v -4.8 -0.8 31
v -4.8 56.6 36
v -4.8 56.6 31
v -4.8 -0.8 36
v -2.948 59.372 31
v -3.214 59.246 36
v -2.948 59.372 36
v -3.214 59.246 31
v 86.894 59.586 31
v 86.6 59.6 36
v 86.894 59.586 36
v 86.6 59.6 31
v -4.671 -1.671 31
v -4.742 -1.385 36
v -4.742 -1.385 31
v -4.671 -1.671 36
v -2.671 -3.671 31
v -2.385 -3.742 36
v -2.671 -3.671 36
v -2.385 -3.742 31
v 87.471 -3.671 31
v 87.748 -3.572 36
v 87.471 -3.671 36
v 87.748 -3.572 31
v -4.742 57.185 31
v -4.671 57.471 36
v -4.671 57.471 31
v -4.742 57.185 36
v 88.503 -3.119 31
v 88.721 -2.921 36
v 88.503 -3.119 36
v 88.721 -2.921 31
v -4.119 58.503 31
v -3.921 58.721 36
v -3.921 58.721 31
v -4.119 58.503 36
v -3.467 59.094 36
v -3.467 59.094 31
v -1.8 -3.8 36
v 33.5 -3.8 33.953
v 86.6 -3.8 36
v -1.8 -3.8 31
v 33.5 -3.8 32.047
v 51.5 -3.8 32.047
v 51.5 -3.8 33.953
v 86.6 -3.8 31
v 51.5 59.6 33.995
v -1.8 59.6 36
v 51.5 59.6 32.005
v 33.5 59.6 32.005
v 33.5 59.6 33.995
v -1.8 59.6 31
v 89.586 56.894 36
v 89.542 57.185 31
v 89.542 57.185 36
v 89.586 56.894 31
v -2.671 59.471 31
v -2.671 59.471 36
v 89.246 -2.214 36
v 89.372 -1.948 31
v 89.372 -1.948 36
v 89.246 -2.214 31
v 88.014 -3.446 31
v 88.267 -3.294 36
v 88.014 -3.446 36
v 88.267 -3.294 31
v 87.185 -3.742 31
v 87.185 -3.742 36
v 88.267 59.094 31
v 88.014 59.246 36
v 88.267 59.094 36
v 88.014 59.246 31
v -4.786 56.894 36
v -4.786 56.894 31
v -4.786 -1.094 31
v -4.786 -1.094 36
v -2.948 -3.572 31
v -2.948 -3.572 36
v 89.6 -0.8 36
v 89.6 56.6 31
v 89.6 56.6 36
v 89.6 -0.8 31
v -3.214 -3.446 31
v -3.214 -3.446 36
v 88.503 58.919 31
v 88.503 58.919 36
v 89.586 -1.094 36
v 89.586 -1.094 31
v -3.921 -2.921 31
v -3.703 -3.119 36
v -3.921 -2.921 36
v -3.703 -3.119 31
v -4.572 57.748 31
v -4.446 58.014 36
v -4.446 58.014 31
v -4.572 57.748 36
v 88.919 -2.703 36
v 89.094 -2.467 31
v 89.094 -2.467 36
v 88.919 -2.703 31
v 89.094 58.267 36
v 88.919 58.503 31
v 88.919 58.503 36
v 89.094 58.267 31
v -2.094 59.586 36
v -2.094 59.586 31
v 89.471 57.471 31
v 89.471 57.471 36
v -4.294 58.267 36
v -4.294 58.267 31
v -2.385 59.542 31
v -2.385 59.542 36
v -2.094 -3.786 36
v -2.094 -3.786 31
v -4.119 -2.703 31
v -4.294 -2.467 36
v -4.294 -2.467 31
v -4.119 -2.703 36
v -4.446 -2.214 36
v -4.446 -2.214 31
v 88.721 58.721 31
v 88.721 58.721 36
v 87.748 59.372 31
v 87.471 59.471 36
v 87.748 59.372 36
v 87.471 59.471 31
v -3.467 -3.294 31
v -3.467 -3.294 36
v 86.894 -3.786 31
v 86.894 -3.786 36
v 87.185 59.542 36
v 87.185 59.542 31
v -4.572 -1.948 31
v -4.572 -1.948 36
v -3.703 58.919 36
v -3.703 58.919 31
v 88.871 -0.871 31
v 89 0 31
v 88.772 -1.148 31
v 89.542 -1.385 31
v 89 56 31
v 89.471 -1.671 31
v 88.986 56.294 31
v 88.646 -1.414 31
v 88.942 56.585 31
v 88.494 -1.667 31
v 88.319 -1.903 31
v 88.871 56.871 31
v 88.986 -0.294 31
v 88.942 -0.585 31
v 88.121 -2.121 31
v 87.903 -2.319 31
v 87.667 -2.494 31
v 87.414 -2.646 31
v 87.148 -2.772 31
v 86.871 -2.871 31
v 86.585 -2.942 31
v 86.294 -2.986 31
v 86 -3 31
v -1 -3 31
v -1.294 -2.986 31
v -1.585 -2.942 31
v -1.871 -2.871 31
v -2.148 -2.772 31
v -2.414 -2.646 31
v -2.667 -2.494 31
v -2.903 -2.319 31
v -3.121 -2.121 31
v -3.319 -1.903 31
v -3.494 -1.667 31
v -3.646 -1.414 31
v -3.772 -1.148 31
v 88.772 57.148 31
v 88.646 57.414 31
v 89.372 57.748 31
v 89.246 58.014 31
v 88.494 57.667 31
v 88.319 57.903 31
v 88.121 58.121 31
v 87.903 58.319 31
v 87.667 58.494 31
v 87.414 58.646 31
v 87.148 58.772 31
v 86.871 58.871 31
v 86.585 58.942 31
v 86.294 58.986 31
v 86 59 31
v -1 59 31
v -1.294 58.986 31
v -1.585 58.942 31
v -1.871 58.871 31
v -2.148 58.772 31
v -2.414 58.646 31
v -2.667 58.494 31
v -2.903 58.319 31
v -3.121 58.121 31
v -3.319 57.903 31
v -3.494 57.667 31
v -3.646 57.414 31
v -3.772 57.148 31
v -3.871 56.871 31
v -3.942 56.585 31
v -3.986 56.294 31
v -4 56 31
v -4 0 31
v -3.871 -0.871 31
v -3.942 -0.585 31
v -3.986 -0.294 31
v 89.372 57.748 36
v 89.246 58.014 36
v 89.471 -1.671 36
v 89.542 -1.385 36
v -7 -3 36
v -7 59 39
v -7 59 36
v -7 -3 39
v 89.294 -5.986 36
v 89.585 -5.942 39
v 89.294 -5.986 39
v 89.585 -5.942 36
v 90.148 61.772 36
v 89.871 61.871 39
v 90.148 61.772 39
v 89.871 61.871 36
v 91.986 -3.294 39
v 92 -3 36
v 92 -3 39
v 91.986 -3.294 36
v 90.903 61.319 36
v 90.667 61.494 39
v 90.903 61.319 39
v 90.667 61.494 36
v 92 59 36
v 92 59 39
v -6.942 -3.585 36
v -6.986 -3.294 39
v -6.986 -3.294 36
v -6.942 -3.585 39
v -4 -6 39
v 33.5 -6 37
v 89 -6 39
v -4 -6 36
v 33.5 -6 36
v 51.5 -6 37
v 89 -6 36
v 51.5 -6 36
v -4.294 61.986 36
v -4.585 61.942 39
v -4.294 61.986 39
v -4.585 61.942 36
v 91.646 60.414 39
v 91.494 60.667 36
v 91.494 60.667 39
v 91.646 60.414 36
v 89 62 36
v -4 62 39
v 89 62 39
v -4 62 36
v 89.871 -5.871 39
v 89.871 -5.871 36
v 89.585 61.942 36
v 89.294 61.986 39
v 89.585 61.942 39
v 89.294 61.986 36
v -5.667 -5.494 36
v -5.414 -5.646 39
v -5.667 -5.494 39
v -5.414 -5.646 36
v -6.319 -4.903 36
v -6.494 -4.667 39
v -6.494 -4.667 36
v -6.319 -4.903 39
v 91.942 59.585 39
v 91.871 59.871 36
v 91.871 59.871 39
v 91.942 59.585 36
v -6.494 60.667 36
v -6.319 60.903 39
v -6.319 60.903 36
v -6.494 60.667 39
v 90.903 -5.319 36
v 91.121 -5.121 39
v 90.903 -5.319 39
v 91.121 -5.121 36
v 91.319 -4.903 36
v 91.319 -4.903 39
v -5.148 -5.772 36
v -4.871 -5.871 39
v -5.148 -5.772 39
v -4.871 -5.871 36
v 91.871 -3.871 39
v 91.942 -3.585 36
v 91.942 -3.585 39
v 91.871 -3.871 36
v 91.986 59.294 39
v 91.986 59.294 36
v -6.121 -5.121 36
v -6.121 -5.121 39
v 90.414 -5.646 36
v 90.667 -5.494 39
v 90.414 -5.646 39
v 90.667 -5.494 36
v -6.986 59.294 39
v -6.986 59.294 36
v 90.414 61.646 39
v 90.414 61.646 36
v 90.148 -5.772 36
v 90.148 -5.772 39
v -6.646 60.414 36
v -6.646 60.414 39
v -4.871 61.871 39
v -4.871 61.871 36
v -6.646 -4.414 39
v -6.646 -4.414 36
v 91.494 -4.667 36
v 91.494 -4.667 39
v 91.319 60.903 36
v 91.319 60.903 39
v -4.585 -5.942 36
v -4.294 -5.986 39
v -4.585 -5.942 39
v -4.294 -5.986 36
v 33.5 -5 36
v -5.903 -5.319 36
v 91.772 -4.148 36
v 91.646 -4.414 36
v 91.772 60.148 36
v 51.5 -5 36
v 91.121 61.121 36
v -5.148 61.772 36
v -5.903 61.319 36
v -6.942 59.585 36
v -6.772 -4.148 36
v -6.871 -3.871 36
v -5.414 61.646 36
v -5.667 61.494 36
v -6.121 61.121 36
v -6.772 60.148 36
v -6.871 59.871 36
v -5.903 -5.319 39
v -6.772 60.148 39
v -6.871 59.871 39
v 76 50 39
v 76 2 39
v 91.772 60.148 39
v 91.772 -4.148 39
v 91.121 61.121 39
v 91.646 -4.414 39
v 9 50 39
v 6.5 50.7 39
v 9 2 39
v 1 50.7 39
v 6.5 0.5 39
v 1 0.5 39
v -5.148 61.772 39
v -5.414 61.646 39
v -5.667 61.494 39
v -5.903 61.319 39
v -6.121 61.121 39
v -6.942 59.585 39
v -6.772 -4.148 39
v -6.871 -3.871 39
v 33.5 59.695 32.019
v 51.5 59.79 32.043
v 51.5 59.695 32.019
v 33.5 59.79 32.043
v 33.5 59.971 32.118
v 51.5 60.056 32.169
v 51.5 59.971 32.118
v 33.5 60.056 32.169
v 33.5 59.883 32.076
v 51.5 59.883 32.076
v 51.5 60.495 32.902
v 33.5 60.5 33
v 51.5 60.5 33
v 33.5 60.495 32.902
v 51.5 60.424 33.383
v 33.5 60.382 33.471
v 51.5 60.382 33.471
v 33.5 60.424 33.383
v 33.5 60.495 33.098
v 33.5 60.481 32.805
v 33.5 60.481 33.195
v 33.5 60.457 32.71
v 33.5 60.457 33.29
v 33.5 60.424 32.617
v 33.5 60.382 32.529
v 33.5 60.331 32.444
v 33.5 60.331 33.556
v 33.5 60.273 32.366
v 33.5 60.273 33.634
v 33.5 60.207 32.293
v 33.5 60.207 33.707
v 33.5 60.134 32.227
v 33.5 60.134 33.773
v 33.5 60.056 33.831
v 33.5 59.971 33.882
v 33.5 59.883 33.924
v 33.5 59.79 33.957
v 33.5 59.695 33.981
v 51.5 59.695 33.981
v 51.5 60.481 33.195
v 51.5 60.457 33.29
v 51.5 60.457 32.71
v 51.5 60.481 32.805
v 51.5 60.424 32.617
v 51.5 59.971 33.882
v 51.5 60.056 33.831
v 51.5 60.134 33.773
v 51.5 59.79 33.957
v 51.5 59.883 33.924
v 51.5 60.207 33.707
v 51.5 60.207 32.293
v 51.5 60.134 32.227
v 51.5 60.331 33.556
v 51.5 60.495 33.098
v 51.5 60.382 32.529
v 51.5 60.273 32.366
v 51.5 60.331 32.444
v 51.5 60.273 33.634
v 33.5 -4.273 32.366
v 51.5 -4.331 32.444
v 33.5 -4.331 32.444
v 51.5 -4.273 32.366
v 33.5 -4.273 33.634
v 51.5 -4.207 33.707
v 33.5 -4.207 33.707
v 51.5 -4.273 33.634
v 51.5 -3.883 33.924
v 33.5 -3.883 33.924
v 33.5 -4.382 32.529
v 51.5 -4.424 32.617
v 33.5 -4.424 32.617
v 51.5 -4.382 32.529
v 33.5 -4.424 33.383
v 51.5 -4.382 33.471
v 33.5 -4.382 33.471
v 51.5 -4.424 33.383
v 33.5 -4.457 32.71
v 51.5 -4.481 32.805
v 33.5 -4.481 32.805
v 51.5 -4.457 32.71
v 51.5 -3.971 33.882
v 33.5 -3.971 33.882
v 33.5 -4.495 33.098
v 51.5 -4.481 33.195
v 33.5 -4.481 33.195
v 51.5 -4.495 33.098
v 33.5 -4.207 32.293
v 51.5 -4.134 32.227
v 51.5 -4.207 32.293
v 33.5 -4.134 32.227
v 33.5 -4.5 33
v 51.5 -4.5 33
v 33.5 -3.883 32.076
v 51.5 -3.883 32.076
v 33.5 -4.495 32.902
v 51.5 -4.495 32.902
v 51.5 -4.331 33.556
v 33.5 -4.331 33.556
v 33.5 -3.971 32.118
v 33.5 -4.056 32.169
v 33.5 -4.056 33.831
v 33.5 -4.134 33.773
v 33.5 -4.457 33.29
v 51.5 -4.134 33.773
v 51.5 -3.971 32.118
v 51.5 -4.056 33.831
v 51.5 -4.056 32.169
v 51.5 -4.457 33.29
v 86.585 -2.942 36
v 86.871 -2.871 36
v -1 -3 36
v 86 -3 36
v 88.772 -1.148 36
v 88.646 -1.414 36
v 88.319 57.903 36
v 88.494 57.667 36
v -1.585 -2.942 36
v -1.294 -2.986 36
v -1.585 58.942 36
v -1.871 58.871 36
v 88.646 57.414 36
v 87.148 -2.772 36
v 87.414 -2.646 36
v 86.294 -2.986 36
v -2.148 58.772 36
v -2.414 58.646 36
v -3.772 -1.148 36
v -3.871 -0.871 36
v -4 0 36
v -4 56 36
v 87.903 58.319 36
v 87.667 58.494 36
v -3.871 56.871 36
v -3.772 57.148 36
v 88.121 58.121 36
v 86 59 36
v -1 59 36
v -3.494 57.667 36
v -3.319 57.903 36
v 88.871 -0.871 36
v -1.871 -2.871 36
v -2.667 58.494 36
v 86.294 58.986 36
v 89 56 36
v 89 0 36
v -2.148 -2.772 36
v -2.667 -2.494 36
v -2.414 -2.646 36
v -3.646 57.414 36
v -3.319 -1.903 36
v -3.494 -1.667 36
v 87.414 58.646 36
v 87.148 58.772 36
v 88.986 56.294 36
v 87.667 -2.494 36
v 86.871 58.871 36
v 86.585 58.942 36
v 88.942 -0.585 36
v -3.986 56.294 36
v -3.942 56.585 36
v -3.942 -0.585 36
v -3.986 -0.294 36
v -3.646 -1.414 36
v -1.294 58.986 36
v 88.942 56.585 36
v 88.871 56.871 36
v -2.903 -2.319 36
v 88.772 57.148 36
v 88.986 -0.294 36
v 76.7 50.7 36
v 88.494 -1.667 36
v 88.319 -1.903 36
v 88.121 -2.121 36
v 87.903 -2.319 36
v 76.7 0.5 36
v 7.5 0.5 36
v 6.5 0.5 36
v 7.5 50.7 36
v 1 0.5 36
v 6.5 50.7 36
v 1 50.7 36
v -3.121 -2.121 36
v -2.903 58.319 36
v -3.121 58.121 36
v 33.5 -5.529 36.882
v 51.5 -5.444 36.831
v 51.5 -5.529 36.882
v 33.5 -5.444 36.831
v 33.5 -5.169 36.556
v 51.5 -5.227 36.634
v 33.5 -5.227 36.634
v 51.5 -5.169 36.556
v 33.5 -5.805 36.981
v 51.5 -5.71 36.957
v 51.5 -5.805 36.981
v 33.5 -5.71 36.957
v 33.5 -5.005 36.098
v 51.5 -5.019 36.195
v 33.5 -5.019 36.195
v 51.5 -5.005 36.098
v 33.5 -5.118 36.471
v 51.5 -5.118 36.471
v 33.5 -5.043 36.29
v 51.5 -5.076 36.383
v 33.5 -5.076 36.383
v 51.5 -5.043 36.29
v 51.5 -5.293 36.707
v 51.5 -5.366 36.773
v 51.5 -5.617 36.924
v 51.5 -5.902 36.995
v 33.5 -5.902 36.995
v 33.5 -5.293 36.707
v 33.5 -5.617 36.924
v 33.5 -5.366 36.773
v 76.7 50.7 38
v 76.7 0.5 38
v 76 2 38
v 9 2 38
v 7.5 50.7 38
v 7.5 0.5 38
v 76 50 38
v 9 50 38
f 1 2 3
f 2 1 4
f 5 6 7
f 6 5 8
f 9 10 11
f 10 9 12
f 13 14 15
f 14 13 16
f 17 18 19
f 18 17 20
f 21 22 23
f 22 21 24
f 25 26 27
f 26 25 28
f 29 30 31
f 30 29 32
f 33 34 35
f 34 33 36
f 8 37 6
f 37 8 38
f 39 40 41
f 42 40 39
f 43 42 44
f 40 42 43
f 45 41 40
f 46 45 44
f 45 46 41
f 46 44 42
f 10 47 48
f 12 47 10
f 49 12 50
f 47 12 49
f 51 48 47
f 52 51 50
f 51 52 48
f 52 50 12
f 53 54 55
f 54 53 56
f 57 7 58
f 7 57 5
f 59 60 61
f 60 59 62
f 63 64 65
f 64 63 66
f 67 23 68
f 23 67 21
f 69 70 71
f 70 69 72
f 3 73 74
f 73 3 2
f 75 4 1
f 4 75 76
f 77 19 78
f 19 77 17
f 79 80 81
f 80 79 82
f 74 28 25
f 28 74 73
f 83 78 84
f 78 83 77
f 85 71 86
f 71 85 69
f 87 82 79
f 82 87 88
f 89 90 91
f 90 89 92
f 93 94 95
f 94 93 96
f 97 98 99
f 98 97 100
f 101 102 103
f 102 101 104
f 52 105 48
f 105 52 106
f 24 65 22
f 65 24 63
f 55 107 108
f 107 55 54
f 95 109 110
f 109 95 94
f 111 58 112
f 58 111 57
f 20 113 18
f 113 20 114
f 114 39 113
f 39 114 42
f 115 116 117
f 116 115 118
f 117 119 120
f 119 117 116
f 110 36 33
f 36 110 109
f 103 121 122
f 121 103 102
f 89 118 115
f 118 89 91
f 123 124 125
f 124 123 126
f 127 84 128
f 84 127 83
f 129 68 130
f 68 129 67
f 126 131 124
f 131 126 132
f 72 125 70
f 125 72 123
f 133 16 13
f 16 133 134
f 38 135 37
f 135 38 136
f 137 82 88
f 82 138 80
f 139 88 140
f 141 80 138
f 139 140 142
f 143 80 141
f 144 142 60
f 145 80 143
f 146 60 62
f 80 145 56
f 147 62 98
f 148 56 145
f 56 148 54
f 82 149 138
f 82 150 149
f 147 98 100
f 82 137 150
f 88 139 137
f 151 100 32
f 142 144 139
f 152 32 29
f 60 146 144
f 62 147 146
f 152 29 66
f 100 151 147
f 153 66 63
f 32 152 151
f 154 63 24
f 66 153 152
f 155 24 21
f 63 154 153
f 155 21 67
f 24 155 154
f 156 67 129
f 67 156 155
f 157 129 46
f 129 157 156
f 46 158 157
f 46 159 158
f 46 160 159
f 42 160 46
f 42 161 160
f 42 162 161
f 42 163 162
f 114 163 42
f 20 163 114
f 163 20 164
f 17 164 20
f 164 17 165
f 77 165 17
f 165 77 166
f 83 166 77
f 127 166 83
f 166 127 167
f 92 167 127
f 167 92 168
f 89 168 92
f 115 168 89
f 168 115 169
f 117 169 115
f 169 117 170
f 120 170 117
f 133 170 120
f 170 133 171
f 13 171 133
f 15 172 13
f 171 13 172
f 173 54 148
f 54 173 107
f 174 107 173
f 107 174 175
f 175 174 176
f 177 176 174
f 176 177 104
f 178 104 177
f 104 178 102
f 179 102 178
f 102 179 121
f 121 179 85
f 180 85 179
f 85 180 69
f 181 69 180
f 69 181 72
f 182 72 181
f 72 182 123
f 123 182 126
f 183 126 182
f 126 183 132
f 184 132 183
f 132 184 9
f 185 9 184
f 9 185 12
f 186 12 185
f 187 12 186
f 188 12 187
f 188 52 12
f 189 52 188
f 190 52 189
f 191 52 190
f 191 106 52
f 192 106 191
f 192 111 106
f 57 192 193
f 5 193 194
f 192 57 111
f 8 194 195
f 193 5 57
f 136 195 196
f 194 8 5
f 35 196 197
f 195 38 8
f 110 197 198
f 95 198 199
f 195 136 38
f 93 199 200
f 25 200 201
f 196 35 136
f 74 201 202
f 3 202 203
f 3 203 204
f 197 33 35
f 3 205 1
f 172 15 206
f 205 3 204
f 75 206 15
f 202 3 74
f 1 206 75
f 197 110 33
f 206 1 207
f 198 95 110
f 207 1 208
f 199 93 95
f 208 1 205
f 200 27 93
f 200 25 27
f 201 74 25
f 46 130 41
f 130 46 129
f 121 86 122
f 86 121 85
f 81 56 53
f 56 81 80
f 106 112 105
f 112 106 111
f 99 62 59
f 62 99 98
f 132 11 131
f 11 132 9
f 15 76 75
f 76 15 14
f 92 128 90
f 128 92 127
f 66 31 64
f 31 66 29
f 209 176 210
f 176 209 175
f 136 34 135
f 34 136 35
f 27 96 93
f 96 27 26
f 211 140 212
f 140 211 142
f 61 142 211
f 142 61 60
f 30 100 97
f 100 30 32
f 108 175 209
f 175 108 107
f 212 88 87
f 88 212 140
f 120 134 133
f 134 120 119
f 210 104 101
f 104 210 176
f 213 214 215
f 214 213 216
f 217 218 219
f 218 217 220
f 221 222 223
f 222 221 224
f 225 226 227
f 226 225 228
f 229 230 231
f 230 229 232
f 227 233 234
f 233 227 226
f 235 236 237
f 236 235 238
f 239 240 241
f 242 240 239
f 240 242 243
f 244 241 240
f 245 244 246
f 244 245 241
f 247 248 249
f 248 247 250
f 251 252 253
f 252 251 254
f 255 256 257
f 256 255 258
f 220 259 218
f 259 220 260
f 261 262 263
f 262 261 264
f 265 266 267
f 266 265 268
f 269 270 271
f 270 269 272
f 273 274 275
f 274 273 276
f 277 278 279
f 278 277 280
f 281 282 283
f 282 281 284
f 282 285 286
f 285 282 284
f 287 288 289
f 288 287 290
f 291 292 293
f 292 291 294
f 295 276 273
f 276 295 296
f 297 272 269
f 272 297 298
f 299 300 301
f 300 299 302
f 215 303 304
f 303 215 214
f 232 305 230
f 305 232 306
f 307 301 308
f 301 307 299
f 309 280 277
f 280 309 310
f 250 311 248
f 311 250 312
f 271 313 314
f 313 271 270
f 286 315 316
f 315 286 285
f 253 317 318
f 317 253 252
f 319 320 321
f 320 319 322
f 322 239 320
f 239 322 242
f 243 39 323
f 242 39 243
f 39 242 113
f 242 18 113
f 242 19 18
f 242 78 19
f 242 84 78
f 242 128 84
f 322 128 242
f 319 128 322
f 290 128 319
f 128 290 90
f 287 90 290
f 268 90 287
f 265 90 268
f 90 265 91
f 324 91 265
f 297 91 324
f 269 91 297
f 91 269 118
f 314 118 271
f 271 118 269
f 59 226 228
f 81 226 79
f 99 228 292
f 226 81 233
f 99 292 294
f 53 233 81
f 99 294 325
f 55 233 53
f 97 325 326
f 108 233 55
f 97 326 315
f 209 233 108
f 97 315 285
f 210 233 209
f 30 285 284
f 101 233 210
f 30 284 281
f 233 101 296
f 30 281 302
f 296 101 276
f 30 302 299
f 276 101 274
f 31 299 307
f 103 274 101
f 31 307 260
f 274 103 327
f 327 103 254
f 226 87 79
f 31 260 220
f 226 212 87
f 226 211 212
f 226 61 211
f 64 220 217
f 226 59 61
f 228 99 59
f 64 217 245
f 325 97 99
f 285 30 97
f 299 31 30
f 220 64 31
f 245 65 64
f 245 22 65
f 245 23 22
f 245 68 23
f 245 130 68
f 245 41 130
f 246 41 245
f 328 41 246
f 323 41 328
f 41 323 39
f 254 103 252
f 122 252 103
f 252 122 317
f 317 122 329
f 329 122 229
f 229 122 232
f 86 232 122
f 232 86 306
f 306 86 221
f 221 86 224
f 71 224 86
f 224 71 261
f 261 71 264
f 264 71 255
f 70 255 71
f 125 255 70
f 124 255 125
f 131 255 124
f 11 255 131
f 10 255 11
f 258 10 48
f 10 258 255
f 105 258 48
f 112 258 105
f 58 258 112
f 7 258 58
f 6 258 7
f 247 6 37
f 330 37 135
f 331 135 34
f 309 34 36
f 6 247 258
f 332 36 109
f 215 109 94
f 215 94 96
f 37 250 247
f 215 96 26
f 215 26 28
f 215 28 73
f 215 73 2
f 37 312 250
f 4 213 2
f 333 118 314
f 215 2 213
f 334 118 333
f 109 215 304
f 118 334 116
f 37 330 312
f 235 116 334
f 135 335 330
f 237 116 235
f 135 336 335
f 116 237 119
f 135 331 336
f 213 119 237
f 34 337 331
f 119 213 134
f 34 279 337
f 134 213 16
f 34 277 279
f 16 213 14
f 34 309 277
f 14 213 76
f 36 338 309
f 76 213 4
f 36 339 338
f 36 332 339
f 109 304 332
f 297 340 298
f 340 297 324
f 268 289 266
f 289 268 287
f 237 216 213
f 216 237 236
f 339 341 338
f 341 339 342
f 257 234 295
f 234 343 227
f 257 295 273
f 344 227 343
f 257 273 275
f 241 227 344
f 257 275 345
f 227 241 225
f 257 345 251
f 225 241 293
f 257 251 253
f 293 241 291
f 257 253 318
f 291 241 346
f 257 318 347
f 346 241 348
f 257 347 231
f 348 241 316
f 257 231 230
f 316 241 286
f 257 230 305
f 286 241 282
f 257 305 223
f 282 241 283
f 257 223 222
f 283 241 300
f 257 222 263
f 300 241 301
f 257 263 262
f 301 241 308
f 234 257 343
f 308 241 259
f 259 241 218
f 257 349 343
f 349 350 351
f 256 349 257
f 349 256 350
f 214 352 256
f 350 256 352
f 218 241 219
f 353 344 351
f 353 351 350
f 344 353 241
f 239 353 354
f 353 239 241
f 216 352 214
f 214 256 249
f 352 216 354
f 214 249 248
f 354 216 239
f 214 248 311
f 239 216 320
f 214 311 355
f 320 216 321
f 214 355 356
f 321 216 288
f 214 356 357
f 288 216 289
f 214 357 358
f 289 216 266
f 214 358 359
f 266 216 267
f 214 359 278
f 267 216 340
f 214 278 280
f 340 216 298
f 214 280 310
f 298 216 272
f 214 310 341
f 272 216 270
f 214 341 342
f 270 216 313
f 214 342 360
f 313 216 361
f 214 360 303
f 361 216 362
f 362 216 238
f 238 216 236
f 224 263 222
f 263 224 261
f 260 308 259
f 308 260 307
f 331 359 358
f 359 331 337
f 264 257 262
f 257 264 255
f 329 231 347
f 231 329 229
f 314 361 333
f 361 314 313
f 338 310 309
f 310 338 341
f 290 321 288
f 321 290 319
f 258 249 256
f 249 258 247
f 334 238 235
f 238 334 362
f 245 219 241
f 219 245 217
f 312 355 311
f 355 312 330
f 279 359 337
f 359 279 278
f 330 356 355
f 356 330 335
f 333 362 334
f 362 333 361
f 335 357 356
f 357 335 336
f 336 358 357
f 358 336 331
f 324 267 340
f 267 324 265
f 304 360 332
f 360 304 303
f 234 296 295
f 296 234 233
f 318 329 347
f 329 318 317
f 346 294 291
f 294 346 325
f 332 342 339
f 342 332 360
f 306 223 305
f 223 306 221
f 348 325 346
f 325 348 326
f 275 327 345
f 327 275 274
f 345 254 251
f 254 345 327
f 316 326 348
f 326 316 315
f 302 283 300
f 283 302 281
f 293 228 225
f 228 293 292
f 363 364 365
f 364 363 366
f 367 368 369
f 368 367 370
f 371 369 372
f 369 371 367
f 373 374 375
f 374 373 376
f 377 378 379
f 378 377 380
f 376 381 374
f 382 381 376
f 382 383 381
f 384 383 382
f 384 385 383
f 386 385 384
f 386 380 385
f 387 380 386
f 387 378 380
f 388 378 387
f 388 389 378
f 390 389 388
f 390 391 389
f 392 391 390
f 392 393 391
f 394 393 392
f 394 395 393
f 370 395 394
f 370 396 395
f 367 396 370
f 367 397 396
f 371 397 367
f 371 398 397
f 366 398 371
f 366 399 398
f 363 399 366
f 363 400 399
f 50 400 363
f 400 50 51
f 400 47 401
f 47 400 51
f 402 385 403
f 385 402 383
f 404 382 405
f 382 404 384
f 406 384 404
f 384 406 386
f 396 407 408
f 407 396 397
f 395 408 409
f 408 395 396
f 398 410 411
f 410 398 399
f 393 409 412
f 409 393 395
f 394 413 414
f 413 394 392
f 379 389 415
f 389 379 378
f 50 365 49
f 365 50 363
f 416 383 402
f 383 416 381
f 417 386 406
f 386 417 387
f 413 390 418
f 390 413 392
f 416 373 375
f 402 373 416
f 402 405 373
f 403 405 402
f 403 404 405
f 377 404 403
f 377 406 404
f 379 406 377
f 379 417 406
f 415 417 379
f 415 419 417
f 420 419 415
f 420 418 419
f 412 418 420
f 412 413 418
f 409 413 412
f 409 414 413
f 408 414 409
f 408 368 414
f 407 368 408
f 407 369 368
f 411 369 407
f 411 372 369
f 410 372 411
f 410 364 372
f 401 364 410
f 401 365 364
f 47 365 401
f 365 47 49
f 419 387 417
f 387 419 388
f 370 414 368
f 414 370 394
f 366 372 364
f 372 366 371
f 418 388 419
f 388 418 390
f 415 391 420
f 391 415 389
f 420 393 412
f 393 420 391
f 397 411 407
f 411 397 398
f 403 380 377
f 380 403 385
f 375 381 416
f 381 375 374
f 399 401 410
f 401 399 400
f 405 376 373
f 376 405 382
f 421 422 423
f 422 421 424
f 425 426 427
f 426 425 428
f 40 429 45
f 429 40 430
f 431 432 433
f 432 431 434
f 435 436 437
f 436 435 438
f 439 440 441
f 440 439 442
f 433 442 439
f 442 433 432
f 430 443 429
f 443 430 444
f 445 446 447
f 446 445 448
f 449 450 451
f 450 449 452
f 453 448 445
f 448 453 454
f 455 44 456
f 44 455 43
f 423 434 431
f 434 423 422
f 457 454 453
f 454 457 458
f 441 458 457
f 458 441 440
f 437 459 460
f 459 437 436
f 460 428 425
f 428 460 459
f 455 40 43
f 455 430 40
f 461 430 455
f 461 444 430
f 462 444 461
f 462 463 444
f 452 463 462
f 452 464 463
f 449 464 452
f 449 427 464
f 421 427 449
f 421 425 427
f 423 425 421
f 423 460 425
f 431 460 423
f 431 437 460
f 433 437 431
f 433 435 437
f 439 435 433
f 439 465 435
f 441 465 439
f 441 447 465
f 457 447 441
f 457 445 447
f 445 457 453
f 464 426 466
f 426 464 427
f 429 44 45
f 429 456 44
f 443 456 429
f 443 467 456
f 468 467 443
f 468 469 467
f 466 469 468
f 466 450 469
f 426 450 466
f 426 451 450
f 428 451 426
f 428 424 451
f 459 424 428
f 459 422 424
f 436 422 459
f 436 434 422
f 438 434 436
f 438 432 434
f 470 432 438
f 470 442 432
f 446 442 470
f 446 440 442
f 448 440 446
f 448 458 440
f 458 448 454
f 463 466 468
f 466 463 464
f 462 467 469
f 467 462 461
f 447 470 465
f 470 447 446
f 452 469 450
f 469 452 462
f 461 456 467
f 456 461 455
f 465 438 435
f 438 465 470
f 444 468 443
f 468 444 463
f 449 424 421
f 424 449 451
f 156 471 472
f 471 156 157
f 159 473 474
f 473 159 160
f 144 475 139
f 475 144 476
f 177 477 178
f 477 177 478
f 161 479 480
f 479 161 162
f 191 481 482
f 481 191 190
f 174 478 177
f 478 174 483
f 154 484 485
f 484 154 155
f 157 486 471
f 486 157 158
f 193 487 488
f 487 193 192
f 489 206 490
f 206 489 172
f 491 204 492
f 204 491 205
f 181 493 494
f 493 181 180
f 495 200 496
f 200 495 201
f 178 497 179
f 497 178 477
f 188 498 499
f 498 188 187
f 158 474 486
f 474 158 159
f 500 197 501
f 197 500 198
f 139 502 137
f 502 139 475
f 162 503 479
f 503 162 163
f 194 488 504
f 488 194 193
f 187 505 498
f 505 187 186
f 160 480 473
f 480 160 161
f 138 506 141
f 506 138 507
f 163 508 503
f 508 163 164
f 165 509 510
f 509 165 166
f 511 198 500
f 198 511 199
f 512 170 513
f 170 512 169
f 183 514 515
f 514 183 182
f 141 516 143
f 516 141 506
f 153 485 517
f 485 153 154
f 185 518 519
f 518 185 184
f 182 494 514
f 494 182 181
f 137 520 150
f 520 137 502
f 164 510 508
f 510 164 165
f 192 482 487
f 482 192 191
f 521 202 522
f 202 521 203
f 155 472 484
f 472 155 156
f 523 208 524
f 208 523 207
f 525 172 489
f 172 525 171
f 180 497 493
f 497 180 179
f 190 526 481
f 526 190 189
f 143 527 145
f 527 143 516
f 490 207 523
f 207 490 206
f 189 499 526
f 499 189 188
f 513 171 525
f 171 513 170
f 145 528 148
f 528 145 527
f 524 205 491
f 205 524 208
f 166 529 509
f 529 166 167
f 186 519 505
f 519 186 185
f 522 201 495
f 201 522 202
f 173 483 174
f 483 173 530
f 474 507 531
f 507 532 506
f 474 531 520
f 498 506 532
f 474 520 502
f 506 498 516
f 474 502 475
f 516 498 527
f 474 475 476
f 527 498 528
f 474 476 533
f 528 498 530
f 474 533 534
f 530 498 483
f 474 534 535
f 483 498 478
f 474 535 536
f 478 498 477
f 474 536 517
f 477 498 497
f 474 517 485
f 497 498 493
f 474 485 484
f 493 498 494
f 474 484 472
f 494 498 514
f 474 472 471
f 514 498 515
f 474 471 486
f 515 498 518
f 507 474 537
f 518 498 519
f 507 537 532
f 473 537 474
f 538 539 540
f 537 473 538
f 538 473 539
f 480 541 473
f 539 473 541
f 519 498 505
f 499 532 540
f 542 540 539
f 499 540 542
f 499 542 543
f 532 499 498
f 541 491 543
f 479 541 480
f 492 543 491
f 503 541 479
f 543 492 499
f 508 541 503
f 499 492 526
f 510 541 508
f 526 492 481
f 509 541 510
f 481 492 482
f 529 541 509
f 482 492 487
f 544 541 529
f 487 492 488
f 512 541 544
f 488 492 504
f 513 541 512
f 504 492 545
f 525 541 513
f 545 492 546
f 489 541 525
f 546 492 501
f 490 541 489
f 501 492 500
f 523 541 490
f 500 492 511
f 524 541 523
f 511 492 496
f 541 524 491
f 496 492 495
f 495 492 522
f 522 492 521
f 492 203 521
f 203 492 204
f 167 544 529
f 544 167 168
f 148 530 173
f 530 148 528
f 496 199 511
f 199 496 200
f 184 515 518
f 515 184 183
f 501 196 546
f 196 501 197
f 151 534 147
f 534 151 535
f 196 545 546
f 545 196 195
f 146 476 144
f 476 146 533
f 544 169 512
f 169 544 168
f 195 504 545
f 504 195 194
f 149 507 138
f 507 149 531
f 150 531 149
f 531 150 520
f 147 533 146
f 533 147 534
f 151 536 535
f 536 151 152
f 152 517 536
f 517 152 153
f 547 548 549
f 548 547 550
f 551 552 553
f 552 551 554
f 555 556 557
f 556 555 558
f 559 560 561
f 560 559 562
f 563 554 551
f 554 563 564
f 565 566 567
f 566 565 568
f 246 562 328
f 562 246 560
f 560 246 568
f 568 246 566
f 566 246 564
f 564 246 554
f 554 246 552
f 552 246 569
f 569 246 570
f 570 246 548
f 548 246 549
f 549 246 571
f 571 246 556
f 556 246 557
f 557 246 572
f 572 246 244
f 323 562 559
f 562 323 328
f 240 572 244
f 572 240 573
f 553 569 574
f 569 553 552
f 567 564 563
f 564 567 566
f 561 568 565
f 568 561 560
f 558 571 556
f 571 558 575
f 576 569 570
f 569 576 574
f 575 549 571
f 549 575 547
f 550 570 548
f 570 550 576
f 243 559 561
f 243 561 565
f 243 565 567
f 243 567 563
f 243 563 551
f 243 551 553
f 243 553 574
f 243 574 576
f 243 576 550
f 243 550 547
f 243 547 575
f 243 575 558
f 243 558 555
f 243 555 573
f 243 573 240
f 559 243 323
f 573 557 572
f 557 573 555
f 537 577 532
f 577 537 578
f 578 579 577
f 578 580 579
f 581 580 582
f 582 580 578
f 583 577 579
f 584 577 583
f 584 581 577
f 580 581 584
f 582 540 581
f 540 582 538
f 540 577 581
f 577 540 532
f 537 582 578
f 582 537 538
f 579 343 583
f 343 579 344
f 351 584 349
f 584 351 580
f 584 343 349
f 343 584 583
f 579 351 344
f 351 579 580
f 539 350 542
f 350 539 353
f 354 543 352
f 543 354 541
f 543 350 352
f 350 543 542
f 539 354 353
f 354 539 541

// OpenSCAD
$fn=64;

bias = 0;
depth = 26;
cr = 3;
width = 85 + bias * 2 + 10;
height = 56 + bias * 2 + 8;
thickness = 2;

module roundedCube(w,h,d,expand) {
	hull() {
		translate([cr-expand,cr-expand,0]) cylinder(d+expand, cr,cr);
		translate([cr-expand, h - cr+expand,0]) cylinder(d+expand, cr,cr);
		translate([w - cr+expand, cr-expand,0]) cylinder(d+expand, cr,cr);
		translate([w - cr+expand, h - cr+expand,0]) cylinder(d+expand, cr,cr);
	}
}
// case
module case() {
	difference() {
		
		color("lightblue") translate([0,0,-thickness]) roundedCube(width, height, depth, thickness);
		color("lightblue") roundedCube(width, height, depth + 1, 0);
		
		color("blue") translate([width/2 - 41,height/2,-thickness-1]) cylinder(thickness + 2, 3,3);
		color("blue") translate([width/2 + 41,height/2,-thickness-1]) cylinder(thickness + 2, 3,3);
		color("blue") translate([width/2 - 41 + 53,height/2,-thickness-1]) cylinder(thickness + 2, 15,15);	
		
		// cutout for usb
		color("blue") translate([width/2 , -thickness-1, 0]) rotate([-90,0,0]) cylinder(thickness + 2, 10,10);
		color("blue") translate([width/2 , -thickness-1, 0]) cube([8,8,depth*2+2], center=true);
		
		color("blue") translate([width/2 , -thickness-1, 0]) cube([6,70,thickness*2+1], center=true);
		
		
		// cutout for the locking tabs
		color("blue") translate([width/2 -10, height, depth-3]) rotate([0,90,0]) cylinder(20,1.2,1.2);
		color("blue") translate([width/2 -10, 0, depth-3]) rotate([0,90,0]) cylinder(20,1.2,1.2);
	}
	

}

module posts(expand) {
	// posts: a base and then the part that goes inside the drill holes
	baseHeight = 1;
	module post(x,y,poleHeight){
		color("green") translate([x,y,0]) cylinder(baseHeight, 4,4);
		color("lightgreen") translate([x,y,0]) cylinder(poleHeight, 1.2+expand,1.2+expand);
	}

	post(3.5+78-20,3.5+49,3);
	post(3.5,3.5+49,3);
}


// lid
module lid() {
	difference() {
		union() {
			color("red") translate([0.2,0.2,depth-5]) roundedCube(width-.6, height-.6, 6, 0);
			color("red") translate([-thickness,-thickness,depth]) roundedCube(width+thickness*2, height+thickness*2, 3, 0);

			color("orange") translate([width/2 -9, height-.5, depth-3]) rotate([0,90,0]) cylinder(18,1,1);
			color("orange") translate([width/2 -9, .5, depth-3]) rotate([0,90,0]) cylinder(18,1,1);
		}

		//	remove some of the interior to make the lip		
		color("orange") translate([1,1,depth-6]) roundedCube(width-2, height-2, 6, 0);

		// a place to stick a screwdriver to pop it open
		color("orange") translate([width/2 -9, -2, depth]) rotate([0,90,0]) cylinder(18,1,1);

			
		// cutout for the screen and buttons
		color("orange") translate([8+5-.5,5-.5,depth-6]) cube([69+.2,50+.2,8]);	
		color("orange") translate([8+6,6,depth-6]) cube([69-2,50-2,10]);	
		
		color("orange") translate([6,5-.5,depth-6]) cube([5.5,50+.2,10]);	
	}
	
}


//color("gray")
difference() {
	union() {
		//translate([-5,-4,0]) case();
		//posts(0);
		translate([-5,-4,10]) lid();
	}
}
